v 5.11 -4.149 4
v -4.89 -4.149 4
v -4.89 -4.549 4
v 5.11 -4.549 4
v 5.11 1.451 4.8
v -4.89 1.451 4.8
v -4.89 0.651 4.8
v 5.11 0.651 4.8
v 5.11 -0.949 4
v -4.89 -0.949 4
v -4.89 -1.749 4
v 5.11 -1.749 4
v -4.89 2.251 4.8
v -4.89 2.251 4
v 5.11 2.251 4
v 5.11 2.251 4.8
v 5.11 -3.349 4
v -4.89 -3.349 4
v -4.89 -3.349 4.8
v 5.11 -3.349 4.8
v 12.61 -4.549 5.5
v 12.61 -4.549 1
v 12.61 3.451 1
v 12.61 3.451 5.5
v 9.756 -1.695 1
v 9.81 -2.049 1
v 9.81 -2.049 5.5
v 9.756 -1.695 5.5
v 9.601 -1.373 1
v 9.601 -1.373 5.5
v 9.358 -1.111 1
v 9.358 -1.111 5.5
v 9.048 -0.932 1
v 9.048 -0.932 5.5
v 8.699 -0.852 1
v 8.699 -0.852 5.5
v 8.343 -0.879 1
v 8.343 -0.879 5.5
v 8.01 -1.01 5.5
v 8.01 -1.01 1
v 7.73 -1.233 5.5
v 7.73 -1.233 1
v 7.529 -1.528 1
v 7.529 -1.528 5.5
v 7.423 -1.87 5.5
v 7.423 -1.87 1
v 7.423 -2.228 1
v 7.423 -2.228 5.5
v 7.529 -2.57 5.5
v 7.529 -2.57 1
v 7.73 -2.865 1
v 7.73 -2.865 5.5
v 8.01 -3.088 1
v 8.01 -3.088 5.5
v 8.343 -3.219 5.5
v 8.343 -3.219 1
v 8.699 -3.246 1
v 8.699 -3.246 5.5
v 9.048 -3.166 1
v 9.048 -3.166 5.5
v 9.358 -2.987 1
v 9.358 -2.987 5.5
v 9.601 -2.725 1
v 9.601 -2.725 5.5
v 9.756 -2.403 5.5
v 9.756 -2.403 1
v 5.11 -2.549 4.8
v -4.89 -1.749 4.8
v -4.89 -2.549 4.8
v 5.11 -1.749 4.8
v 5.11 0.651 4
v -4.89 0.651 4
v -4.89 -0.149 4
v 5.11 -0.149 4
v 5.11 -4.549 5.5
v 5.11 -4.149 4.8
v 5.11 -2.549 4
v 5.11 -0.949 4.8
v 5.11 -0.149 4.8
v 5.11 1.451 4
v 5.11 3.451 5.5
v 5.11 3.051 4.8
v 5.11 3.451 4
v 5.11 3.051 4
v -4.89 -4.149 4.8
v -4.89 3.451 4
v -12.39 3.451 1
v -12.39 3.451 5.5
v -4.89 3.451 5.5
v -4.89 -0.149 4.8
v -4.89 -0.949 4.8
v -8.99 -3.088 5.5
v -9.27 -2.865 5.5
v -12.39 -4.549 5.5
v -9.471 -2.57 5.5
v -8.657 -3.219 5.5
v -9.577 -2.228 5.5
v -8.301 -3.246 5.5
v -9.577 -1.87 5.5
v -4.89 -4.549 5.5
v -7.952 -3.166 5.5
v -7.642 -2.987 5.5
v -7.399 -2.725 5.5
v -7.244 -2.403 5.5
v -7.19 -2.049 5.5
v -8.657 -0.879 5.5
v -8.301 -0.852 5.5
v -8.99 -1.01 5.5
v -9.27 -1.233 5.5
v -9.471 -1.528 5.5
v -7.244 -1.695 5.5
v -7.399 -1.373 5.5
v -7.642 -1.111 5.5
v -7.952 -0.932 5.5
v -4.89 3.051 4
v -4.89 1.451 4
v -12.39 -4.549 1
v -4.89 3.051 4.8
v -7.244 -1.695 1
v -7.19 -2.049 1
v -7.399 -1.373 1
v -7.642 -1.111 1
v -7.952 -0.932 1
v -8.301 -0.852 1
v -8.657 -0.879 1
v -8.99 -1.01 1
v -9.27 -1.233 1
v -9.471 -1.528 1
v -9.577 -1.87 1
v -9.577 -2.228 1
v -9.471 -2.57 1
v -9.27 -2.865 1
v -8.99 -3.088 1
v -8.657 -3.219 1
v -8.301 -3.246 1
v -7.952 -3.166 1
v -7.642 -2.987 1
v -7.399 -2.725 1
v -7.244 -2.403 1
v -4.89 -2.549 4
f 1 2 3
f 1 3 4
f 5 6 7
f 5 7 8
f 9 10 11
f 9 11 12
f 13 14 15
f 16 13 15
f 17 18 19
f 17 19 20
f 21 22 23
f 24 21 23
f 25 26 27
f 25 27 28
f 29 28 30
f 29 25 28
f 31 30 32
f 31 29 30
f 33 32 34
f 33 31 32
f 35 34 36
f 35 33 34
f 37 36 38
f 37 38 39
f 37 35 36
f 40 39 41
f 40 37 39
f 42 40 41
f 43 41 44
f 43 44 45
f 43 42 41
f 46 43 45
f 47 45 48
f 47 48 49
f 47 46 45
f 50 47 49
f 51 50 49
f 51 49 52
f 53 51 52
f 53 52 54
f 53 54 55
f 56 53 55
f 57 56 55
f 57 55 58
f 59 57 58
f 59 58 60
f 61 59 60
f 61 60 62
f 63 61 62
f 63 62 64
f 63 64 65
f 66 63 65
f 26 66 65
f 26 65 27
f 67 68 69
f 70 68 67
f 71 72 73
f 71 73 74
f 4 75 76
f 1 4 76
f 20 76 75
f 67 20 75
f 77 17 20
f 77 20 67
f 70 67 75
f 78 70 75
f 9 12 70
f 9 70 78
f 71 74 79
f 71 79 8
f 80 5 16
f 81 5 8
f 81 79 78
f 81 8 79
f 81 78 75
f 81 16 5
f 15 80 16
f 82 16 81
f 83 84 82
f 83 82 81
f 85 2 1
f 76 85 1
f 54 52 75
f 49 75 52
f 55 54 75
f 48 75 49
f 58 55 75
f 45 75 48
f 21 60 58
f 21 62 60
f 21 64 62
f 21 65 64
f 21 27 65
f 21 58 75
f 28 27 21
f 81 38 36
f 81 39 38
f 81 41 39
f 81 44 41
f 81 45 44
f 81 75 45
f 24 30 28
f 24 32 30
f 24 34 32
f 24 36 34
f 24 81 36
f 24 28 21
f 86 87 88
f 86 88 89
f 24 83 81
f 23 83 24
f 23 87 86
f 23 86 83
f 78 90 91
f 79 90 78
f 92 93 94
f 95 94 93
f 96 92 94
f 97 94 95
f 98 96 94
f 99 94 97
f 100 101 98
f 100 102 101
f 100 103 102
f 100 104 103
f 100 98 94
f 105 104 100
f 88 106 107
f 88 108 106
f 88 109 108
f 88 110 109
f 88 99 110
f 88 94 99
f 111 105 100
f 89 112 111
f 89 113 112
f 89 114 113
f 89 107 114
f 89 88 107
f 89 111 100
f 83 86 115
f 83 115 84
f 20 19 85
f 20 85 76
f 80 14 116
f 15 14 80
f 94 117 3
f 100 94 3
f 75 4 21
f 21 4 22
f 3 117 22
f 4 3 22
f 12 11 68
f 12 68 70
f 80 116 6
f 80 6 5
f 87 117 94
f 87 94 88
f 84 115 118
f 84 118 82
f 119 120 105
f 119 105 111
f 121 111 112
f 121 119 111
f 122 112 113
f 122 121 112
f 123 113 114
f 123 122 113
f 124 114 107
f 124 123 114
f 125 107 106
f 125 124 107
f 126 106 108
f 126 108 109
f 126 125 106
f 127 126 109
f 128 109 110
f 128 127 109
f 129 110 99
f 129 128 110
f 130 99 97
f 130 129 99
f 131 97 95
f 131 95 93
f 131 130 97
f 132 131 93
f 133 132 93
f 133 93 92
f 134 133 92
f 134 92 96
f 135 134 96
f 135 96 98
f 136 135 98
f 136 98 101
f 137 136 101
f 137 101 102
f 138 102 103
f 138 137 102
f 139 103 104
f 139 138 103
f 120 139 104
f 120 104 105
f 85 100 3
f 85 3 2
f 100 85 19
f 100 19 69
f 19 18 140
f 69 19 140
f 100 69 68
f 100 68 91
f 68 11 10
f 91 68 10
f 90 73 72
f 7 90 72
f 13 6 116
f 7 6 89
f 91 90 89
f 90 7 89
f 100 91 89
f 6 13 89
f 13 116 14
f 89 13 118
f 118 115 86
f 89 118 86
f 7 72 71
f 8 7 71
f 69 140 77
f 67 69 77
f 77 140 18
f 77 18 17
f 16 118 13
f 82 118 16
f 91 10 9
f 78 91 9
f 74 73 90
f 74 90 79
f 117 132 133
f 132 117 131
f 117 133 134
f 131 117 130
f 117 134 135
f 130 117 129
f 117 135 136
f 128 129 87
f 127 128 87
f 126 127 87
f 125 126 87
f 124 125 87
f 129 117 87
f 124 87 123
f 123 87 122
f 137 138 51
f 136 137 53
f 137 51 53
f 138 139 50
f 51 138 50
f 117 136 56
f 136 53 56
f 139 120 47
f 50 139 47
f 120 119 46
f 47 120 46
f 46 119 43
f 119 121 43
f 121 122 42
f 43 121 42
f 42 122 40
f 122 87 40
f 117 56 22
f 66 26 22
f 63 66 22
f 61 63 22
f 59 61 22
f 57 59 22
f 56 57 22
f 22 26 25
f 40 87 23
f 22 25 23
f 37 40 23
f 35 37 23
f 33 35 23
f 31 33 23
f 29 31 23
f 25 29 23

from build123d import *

# Parameters (mm, degrees)
SKETCH_1_W          = 25
SKETCH_1_H          = 8
SKETCH_1_R          = 1.2
EXTRUDE_2_DEPTH     = 4
SKETCH_2_W          = 10
SKETCH_2_H          = 0.8
EXTRUDE_3_DEPTH     = 0.8
SKETCH_3_W          = 7.5
SKETCH_3_H          = 8
SKETCH_3_R          = 1.2
EXTRUDE_4_DEPTH     = 1.5
SKETCH_4_W          = 25
SKETCH_4_H          = 1
CUT_EXTRUDE_1_DEPTH = 19.5


with BuildPart() as part:
    # 草图1 → 凸台-拉伸2 (new body)
    with BuildSketch(Plane.XY):
        with Locations((0.109785312, -0.548926558)):
            Rectangle(SKETCH_1_W, SKETCH_1_H)
        with Locations((-8.390214688, -2.048926558)):
            Circle(SKETCH_1_R, mode=Mode.SUBTRACT)
        with Locations((8.609785312, -2.048926558)):
            Circle(SKETCH_1_R, mode=Mode.SUBTRACT)
    extrude(amount=EXTRUDE_2_DEPTH)

    # 草图2 → 凸台-拉伸3 (add)
    with BuildSketch(Plane.XY.offset(4)):
        with Locations((0.109785312, -3.748926558)):
            Rectangle(SKETCH_2_W, SKETCH_2_H)
        with Locations((0.109785312, -2.148926558)):
            Rectangle(SKETCH_2_W, SKETCH_2_H)
        with Locations((0.109785312, -0.548926558)):
            Rectangle(SKETCH_2_W, SKETCH_2_H)
        with Locations((0.109785312, 2.651073442)):
            Rectangle(SKETCH_2_W, SKETCH_2_H)
        with Locations((0.109785312, 1.051073442)):
            Rectangle(SKETCH_2_W, SKETCH_2_H)
    extrude(amount=EXTRUDE_3_DEPTH)

    # 草图3 → 凸台-拉伸4 (add)
    # profile 1 of 2: a face of its own
    with BuildSketch(Plane.XY.offset(4)):
        with Locations((-8.640214688, -0.548926558)):
            Rectangle(SKETCH_3_W, SKETCH_3_H)
        with Locations((-8.390214688, -2.048926558)):
            Circle(SKETCH_3_R, mode=Mode.SUBTRACT)
    # profile 2 of 2: a face of its own
    with BuildSketch(Plane.XY.offset(4)):
        with Locations((8.859785312, -0.548926558)):
            Rectangle(SKETCH_3_W, SKETCH_3_H)
        with Locations((8.609785312, -2.048926558)):
            Circle(SKETCH_3_R, mode=Mode.SUBTRACT)
    extrude(amount=EXTRUDE_4_DEPTH)

    # 草图4 → 切除-拉伸1 (cut)
    with BuildSketch(Plane(origin=(0, 3.451073442, 0), x_dir=(1, 0, 0), z_dir=(0, 1, 0))):
        with Locations((0.109785312, -0.5)):
            Rectangle(SKETCH_4_W, SKETCH_4_H)
    extrude(amount=-CUT_EXTRUDE_1_DEPTH, mode=Mode.SUBTRACT)


solid = part.part
